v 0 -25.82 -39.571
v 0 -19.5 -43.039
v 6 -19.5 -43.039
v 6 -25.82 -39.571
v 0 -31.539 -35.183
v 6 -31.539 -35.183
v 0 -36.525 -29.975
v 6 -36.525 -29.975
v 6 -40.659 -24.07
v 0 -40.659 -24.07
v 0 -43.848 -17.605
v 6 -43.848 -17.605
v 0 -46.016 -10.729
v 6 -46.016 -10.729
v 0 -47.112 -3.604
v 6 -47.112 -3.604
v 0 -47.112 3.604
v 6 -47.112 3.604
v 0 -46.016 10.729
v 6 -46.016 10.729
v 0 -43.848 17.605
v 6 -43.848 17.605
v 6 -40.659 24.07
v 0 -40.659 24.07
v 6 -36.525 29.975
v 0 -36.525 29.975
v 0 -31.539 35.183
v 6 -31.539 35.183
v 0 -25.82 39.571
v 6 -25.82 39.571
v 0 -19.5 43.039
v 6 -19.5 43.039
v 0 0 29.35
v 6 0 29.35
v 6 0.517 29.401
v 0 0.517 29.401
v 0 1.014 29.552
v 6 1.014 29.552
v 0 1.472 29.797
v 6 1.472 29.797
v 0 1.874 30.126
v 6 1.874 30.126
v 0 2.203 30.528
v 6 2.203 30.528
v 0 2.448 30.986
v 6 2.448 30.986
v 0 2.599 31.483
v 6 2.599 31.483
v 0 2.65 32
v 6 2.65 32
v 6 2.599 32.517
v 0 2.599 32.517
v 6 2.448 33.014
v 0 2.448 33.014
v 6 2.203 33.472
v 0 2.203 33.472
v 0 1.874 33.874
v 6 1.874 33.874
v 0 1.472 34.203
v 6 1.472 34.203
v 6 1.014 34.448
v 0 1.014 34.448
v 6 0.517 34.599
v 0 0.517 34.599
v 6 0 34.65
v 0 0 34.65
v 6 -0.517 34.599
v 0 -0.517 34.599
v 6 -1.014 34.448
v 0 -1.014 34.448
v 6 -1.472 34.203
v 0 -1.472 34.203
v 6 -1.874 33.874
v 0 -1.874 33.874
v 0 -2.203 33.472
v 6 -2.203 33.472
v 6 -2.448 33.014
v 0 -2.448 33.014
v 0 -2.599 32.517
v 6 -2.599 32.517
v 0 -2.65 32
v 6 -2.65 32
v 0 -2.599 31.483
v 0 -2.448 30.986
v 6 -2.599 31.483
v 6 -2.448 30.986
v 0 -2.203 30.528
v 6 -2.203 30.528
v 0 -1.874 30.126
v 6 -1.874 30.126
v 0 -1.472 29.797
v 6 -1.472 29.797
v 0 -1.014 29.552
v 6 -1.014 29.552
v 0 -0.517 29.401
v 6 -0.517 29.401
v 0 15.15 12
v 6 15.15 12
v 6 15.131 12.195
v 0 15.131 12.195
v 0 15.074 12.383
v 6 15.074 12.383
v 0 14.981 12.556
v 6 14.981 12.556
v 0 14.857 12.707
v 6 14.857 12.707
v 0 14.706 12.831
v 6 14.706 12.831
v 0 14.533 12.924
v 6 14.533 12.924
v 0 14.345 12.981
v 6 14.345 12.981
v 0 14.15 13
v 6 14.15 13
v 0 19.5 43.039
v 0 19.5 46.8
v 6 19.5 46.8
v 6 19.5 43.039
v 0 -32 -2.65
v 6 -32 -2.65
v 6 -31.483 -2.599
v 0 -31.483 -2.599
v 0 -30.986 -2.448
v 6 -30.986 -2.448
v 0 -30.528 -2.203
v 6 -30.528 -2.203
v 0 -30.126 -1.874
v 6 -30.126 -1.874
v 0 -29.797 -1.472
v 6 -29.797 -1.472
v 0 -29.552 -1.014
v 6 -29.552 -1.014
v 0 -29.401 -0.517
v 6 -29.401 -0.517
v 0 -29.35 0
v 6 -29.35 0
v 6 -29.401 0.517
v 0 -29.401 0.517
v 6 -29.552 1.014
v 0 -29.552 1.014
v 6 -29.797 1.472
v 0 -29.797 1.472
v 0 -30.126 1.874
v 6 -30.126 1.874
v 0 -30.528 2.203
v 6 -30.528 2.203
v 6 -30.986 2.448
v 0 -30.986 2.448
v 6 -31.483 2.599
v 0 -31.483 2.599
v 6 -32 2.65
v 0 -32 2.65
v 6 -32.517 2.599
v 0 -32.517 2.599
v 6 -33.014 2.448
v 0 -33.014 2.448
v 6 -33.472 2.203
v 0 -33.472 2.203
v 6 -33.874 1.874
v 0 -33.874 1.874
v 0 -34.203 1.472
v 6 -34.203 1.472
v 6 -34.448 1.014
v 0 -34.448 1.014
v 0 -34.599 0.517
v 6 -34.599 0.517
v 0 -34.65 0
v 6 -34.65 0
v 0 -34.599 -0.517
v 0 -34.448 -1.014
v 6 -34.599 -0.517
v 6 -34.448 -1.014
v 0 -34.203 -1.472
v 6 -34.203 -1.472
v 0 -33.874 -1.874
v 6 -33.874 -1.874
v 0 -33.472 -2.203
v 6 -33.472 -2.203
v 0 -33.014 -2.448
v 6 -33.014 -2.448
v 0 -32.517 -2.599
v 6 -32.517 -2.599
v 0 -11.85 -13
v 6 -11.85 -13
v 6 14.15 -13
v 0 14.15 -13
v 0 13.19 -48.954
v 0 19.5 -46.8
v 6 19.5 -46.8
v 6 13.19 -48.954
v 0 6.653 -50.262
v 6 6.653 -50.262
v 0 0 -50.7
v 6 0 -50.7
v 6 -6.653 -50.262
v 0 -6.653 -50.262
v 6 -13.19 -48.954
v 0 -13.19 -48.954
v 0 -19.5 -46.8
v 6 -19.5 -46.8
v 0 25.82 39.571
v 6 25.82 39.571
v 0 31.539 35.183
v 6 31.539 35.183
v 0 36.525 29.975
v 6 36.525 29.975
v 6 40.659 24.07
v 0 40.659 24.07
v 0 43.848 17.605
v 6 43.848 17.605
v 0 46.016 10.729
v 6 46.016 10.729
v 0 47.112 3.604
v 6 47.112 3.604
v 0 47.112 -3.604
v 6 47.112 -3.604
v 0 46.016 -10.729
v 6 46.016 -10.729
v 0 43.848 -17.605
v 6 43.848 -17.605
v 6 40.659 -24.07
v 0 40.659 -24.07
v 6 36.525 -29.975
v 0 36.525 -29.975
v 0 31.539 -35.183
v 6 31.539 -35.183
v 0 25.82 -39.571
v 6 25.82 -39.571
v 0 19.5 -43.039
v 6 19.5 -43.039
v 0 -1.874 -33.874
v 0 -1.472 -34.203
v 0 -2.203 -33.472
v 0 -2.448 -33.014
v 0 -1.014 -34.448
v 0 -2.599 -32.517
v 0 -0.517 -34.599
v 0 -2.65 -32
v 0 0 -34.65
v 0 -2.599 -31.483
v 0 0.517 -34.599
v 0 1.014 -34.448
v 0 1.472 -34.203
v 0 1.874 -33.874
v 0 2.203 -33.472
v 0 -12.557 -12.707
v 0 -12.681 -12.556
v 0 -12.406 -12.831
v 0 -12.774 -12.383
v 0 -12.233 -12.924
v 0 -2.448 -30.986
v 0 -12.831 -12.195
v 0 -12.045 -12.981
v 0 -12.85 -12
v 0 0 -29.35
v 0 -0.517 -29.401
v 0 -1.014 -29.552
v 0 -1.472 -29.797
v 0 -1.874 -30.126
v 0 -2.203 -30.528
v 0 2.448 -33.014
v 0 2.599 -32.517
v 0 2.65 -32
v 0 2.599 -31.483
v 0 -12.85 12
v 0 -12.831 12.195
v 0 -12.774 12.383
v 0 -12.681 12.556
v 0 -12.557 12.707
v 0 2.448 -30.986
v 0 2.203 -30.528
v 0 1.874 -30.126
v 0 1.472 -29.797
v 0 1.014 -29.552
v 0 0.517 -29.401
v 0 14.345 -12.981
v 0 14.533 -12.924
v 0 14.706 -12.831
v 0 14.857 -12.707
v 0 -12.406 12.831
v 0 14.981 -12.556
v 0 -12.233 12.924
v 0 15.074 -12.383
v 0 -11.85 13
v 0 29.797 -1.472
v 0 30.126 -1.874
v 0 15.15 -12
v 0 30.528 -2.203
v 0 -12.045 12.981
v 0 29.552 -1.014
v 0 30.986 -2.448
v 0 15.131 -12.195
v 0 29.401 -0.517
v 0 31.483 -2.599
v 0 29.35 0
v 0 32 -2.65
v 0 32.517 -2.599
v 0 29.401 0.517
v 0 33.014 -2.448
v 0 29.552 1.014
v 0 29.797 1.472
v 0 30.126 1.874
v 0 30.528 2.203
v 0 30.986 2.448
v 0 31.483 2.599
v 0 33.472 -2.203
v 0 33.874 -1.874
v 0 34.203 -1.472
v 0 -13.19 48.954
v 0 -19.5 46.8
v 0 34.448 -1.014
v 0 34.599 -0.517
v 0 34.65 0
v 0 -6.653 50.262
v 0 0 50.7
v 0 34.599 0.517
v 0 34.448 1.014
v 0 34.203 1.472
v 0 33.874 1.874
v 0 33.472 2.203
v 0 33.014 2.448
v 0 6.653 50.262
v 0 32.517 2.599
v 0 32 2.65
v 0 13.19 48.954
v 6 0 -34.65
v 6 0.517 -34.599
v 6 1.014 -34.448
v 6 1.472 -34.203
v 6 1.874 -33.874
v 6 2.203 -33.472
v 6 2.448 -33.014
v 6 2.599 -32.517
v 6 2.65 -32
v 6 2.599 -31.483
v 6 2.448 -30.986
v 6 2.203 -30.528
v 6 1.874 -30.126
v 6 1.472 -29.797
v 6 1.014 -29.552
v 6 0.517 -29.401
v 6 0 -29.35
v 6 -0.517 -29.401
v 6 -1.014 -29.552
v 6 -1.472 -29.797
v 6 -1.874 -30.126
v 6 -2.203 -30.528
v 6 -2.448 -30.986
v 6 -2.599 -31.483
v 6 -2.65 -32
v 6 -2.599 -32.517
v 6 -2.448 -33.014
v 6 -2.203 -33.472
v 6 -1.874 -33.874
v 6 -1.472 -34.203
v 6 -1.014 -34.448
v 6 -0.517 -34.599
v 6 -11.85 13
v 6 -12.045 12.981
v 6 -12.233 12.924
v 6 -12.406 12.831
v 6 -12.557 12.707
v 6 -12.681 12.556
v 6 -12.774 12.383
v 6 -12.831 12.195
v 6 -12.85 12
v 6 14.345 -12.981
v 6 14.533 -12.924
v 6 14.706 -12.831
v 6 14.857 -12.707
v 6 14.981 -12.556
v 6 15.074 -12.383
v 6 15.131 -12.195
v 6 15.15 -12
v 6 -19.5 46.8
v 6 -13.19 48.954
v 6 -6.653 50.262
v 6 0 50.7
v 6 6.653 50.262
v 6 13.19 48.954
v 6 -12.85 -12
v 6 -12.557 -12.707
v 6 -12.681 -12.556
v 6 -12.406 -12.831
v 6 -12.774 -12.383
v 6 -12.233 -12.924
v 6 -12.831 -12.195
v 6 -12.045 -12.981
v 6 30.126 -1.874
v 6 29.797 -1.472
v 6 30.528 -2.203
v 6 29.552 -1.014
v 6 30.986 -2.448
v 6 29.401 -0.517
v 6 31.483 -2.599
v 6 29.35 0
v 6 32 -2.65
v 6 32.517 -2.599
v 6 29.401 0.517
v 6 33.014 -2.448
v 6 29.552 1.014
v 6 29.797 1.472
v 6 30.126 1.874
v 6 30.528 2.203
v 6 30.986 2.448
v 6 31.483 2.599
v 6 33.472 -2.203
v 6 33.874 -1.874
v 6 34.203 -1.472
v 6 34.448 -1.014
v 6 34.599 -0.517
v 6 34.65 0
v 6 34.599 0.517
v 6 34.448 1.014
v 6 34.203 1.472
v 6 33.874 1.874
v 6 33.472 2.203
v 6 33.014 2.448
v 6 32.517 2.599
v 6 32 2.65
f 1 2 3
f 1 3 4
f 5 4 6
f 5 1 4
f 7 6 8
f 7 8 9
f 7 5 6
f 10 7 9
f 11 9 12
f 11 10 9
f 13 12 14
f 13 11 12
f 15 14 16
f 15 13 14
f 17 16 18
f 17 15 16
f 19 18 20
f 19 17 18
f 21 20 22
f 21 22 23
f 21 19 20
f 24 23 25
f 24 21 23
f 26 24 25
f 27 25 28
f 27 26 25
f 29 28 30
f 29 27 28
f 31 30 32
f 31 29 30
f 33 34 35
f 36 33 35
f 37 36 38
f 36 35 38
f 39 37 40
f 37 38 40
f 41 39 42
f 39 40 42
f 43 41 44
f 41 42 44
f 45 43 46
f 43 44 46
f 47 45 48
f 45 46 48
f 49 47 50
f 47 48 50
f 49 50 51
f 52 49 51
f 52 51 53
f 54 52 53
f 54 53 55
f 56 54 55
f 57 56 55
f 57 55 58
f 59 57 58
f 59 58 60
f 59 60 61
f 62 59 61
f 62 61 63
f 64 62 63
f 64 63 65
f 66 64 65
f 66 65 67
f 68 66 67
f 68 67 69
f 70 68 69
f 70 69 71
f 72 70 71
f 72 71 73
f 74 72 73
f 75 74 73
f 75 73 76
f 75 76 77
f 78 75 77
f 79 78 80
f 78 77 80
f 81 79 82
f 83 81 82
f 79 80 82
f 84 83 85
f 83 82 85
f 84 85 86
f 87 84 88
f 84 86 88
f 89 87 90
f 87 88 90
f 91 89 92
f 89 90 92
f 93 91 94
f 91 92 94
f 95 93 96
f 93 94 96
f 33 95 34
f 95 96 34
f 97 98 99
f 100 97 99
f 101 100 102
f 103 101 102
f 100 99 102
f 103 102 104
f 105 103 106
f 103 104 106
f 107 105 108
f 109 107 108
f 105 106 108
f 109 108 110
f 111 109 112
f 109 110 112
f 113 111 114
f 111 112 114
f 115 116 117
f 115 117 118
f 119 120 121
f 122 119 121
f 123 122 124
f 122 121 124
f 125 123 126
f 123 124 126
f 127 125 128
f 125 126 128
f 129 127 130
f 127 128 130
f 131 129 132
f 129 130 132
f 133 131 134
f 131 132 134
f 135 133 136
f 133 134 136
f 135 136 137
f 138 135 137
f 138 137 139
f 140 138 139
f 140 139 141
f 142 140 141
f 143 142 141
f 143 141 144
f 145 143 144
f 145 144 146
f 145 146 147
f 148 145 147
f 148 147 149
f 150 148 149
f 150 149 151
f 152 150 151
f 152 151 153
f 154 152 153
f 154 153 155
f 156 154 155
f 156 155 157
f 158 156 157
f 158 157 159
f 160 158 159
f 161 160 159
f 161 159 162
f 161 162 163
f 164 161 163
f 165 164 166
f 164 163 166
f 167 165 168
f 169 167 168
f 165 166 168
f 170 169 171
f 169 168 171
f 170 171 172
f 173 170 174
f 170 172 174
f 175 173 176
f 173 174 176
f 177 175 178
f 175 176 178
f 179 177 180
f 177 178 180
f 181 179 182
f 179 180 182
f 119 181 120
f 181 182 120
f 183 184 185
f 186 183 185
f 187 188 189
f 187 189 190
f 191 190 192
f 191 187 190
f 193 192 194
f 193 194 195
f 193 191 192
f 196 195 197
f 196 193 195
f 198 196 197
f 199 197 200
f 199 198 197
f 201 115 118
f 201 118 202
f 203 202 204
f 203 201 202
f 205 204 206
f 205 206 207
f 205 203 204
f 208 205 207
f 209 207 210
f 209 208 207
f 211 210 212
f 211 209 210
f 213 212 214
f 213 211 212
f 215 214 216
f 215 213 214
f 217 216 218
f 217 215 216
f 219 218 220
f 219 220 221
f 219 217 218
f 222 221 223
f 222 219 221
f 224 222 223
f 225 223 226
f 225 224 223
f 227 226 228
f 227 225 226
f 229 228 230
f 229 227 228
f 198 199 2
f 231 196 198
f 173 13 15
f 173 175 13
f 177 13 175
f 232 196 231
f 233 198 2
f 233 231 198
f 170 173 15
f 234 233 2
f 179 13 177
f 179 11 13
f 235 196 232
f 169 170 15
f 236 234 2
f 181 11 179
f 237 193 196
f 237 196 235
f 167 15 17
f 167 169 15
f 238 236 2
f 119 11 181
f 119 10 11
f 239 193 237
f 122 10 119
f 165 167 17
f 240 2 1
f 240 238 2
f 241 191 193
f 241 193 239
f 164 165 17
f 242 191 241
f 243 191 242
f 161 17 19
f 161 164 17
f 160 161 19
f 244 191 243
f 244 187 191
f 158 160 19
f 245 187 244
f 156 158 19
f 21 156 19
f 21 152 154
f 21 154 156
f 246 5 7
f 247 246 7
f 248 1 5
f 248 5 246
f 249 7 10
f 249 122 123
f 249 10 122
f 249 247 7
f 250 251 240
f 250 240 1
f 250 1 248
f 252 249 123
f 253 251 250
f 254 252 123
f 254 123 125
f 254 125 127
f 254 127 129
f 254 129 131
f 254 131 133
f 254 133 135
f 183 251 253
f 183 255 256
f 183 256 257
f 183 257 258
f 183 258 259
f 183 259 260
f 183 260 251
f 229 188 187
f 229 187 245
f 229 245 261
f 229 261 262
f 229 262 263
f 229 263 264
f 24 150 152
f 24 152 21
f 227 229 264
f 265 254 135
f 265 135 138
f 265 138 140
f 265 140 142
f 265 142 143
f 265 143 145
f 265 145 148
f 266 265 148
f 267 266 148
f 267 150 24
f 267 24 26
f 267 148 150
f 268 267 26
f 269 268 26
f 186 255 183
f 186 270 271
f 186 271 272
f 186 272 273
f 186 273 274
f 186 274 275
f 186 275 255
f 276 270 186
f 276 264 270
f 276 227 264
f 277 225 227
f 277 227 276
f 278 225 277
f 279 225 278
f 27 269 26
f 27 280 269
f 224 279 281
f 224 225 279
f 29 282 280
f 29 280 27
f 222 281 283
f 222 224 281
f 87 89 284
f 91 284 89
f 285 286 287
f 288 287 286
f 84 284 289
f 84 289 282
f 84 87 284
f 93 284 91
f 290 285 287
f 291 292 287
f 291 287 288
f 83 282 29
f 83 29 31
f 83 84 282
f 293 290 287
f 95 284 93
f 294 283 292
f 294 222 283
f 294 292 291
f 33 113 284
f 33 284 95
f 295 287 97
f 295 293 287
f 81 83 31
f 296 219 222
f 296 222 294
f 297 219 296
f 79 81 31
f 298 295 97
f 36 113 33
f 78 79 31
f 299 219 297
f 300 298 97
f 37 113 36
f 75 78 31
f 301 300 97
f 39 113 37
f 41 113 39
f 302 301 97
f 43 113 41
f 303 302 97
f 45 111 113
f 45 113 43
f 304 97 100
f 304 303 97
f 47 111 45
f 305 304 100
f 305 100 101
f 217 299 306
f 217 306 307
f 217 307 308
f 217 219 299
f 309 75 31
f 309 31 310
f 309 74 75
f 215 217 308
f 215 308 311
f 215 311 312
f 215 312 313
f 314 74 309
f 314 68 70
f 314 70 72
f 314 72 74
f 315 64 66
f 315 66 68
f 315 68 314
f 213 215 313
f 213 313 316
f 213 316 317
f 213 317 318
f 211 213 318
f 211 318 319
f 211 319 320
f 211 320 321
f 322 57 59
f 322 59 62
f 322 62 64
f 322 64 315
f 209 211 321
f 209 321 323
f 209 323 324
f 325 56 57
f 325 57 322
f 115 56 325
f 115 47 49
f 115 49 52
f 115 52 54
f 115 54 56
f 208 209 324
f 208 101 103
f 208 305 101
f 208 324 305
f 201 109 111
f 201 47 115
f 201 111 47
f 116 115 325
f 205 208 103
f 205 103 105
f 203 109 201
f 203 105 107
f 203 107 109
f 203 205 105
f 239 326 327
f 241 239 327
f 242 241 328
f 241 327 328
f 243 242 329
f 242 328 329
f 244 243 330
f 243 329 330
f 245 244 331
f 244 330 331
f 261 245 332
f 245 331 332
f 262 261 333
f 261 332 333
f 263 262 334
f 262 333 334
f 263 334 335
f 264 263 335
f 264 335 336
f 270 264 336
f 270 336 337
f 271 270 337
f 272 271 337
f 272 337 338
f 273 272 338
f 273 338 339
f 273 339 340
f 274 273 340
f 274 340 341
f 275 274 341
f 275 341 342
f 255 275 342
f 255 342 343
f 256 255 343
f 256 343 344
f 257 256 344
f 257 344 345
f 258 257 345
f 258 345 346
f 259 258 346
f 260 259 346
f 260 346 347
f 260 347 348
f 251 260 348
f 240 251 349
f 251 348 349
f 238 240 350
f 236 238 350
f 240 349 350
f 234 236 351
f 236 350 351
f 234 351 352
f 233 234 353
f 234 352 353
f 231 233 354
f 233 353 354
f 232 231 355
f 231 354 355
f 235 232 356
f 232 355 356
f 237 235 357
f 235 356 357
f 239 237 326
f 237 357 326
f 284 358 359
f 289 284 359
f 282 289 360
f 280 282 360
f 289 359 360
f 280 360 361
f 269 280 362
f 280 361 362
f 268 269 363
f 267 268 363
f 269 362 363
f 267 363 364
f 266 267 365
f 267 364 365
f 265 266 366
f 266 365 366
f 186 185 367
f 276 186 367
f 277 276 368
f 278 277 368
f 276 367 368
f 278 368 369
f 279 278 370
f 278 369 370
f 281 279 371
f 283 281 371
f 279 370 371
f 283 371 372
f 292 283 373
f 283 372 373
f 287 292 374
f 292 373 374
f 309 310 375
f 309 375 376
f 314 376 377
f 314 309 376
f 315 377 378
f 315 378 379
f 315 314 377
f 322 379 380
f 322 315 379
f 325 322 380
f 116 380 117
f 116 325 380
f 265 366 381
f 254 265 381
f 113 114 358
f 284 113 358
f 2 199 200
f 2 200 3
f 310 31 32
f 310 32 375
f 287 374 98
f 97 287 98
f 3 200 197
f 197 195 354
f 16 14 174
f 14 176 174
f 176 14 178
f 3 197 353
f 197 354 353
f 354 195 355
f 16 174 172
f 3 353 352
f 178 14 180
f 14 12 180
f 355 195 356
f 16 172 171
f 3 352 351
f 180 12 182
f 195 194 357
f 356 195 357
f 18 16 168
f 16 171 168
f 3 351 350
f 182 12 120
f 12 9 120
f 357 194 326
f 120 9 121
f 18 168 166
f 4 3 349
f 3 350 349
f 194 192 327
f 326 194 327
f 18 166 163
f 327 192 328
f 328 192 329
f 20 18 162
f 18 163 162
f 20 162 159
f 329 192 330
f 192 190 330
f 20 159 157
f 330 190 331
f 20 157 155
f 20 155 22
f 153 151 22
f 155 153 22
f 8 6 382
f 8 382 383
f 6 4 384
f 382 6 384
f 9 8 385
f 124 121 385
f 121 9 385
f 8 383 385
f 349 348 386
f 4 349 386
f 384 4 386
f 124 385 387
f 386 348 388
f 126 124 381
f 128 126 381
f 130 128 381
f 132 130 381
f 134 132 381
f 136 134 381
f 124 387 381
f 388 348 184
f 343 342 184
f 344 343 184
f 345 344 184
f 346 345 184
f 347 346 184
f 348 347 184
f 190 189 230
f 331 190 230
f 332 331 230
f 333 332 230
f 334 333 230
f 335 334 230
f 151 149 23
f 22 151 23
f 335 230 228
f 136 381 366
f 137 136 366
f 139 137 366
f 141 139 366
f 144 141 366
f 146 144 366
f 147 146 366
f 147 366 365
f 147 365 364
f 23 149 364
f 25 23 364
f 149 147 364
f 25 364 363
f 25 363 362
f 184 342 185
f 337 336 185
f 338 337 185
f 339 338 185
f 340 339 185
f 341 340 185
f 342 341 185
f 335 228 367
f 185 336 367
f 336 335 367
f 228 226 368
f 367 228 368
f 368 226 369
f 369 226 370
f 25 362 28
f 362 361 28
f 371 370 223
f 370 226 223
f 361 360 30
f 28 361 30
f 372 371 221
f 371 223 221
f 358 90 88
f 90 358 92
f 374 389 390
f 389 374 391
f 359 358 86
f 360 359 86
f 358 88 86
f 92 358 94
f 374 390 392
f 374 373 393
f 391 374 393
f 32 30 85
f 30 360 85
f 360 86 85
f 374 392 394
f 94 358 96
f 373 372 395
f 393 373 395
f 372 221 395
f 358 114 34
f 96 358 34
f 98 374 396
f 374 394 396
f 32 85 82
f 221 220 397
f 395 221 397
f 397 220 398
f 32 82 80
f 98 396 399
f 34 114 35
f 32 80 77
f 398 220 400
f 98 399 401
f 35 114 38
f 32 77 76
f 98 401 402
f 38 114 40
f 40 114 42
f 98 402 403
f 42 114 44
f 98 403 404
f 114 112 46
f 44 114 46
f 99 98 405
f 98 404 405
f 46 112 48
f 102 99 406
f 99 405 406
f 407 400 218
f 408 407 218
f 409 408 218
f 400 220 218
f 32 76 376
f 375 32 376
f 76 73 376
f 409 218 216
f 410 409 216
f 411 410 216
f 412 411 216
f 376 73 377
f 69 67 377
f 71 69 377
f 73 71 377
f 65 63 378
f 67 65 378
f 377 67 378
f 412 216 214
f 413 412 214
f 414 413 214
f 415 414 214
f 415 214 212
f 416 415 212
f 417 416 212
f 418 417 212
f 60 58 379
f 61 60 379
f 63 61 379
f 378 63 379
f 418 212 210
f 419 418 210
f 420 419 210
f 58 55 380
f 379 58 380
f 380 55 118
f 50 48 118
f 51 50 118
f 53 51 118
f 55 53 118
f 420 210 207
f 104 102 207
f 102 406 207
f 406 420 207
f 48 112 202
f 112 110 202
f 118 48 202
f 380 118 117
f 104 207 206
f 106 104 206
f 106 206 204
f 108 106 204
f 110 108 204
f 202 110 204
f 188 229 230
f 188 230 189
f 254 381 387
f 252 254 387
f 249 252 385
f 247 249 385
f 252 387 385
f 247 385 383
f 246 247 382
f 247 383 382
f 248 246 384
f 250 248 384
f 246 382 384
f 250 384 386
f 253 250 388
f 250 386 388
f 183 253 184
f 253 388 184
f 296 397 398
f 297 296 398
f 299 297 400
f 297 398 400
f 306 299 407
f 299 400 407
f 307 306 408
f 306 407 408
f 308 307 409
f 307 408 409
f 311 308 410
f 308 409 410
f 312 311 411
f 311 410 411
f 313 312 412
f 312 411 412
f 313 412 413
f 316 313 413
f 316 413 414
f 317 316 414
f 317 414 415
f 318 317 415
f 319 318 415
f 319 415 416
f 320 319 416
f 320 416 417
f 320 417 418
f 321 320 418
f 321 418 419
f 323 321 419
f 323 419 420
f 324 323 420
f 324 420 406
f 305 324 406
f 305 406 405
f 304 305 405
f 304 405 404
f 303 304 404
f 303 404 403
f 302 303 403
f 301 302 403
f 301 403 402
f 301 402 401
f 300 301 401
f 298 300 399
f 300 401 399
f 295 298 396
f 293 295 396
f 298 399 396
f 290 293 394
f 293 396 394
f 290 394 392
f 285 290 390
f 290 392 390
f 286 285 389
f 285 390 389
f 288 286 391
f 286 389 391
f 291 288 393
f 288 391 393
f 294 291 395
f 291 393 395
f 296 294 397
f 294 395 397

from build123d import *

# Parameters (mm, degrees)
BOSS_EXTRUDE1_DEPTH      = 6
CUT_EXTRUDE1_DEPTH       = 20
M5_CLEARANCE_HOLE1_D     = 5.3
M5_CLEARANCE_HOLE1_DEPTH = 15
M5_CLEARANCE_HOLE1_TIP   = 1.59228064


with BuildPart() as part:
    # Sketch1 → Boss-Extrude1 (new body)
    with BuildSketch(Plane(origin=(0, 0, 0), x_dir=(0, 0, -1), z_dir=(1, 0, 0))):
        with BuildLine():
            Line((-46.8, 19.5), (-43.038500206, 19.5))
            ThreePointArc((-43.038500206, 19.5), (0, 47.25), (43.038500206, 19.5))
            Line((43.038500206, 19.5), (46.8, 19.5))
            ThreePointArc((46.8, 19.5), (50.7, 0), (46.8, -19.5))
            Line((46.8, -19.5), (43.038500206, -19.5))
            ThreePointArc((43.038500206, -19.5), (0, -47.25), (-43.038500206, -19.5))
            Line((-43.038500206, -19.5), (-46.8, -19.5))
            ThreePointArc((-46.8, -19.5), (-50.7, 0), (-46.8, 19.5))
        make_face()
    extrude(amount=BOSS_EXTRUDE1_DEPTH)

    # Sketch2 → Cut-Extrude1 (cut)
    with BuildSketch(Plane(origin=(6, 0, 0), x_dir=(0, 0, -1), z_dir=(1, 0, 0))):
        with BuildLine():
            ThreePointArc((12, -11.85), (12.707106781, -11.557106781), (13, -10.85))
            Line((13, -10.85), (13, -3.85))
            Line((13, -3.85), (13, 14.15))
            ThreePointArc((13, 14.15), (12.707106781, 14.857106781), (12, 15.15))
            Line((12, 15.15), (-12, 15.15))
            ThreePointArc((-12, 15.15), (-12.707106781, 14.857106781), (-13, 14.15))
            Line((-13, 14.15), (-13, -3.85))
            Line((-13, -3.85), (-13, -10.85))
            ThreePointArc((-13, -10.85), (-12.707106781, -11.557106781), (-12, -11.85))
            Line((-12, -11.85), (12, -11.85))
        make_face()
        with BuildLine():
            Line((-12, -12.85), (12, -12.85))
            ThreePointArc((12, -12.85), (12.707106781, -12.557106781), (13, -11.85))
            Line((13, -11.85), (13, -10.85))
            ThreePointArc((13, -10.85), (12.707106781, -11.557106781), (12, -11.85))
            Line((12, -11.85), (-12, -11.85))
            ThreePointArc((-12, -11.85), (-12.707106781, -11.557106781), (-13, -10.85))
            Line((-13, -10.85), (-13, -11.85))
            ThreePointArc((-13, -11.85), (-12.707106781, -12.557106781), (-12, -12.85))
        make_face()
    extrude(amount=-CUT_EXTRUDE1_DEPTH, mode=Mode.SUBTRACT)

    # M5 Clearance Hole1
    with Locations(Plane.ZY):
        with Locations((-32, 0), (0, 32), (32, 0), (0, -32)):
            Hole(M5_CLEARANCE_HOLE1_D / 2, depth=M5_CLEARANCE_HOLE1_DEPTH)
            with Locations((0, 0, -(M5_CLEARANCE_HOLE1_DEPTH + M5_CLEARANCE_HOLE1_TIP / 2))):  # 118° drill point
                Cone(0, M5_CLEARANCE_HOLE1_D / 2, M5_CLEARANCE_HOLE1_TIP, mode=Mode.SUBTRACT)


solid = part.part
